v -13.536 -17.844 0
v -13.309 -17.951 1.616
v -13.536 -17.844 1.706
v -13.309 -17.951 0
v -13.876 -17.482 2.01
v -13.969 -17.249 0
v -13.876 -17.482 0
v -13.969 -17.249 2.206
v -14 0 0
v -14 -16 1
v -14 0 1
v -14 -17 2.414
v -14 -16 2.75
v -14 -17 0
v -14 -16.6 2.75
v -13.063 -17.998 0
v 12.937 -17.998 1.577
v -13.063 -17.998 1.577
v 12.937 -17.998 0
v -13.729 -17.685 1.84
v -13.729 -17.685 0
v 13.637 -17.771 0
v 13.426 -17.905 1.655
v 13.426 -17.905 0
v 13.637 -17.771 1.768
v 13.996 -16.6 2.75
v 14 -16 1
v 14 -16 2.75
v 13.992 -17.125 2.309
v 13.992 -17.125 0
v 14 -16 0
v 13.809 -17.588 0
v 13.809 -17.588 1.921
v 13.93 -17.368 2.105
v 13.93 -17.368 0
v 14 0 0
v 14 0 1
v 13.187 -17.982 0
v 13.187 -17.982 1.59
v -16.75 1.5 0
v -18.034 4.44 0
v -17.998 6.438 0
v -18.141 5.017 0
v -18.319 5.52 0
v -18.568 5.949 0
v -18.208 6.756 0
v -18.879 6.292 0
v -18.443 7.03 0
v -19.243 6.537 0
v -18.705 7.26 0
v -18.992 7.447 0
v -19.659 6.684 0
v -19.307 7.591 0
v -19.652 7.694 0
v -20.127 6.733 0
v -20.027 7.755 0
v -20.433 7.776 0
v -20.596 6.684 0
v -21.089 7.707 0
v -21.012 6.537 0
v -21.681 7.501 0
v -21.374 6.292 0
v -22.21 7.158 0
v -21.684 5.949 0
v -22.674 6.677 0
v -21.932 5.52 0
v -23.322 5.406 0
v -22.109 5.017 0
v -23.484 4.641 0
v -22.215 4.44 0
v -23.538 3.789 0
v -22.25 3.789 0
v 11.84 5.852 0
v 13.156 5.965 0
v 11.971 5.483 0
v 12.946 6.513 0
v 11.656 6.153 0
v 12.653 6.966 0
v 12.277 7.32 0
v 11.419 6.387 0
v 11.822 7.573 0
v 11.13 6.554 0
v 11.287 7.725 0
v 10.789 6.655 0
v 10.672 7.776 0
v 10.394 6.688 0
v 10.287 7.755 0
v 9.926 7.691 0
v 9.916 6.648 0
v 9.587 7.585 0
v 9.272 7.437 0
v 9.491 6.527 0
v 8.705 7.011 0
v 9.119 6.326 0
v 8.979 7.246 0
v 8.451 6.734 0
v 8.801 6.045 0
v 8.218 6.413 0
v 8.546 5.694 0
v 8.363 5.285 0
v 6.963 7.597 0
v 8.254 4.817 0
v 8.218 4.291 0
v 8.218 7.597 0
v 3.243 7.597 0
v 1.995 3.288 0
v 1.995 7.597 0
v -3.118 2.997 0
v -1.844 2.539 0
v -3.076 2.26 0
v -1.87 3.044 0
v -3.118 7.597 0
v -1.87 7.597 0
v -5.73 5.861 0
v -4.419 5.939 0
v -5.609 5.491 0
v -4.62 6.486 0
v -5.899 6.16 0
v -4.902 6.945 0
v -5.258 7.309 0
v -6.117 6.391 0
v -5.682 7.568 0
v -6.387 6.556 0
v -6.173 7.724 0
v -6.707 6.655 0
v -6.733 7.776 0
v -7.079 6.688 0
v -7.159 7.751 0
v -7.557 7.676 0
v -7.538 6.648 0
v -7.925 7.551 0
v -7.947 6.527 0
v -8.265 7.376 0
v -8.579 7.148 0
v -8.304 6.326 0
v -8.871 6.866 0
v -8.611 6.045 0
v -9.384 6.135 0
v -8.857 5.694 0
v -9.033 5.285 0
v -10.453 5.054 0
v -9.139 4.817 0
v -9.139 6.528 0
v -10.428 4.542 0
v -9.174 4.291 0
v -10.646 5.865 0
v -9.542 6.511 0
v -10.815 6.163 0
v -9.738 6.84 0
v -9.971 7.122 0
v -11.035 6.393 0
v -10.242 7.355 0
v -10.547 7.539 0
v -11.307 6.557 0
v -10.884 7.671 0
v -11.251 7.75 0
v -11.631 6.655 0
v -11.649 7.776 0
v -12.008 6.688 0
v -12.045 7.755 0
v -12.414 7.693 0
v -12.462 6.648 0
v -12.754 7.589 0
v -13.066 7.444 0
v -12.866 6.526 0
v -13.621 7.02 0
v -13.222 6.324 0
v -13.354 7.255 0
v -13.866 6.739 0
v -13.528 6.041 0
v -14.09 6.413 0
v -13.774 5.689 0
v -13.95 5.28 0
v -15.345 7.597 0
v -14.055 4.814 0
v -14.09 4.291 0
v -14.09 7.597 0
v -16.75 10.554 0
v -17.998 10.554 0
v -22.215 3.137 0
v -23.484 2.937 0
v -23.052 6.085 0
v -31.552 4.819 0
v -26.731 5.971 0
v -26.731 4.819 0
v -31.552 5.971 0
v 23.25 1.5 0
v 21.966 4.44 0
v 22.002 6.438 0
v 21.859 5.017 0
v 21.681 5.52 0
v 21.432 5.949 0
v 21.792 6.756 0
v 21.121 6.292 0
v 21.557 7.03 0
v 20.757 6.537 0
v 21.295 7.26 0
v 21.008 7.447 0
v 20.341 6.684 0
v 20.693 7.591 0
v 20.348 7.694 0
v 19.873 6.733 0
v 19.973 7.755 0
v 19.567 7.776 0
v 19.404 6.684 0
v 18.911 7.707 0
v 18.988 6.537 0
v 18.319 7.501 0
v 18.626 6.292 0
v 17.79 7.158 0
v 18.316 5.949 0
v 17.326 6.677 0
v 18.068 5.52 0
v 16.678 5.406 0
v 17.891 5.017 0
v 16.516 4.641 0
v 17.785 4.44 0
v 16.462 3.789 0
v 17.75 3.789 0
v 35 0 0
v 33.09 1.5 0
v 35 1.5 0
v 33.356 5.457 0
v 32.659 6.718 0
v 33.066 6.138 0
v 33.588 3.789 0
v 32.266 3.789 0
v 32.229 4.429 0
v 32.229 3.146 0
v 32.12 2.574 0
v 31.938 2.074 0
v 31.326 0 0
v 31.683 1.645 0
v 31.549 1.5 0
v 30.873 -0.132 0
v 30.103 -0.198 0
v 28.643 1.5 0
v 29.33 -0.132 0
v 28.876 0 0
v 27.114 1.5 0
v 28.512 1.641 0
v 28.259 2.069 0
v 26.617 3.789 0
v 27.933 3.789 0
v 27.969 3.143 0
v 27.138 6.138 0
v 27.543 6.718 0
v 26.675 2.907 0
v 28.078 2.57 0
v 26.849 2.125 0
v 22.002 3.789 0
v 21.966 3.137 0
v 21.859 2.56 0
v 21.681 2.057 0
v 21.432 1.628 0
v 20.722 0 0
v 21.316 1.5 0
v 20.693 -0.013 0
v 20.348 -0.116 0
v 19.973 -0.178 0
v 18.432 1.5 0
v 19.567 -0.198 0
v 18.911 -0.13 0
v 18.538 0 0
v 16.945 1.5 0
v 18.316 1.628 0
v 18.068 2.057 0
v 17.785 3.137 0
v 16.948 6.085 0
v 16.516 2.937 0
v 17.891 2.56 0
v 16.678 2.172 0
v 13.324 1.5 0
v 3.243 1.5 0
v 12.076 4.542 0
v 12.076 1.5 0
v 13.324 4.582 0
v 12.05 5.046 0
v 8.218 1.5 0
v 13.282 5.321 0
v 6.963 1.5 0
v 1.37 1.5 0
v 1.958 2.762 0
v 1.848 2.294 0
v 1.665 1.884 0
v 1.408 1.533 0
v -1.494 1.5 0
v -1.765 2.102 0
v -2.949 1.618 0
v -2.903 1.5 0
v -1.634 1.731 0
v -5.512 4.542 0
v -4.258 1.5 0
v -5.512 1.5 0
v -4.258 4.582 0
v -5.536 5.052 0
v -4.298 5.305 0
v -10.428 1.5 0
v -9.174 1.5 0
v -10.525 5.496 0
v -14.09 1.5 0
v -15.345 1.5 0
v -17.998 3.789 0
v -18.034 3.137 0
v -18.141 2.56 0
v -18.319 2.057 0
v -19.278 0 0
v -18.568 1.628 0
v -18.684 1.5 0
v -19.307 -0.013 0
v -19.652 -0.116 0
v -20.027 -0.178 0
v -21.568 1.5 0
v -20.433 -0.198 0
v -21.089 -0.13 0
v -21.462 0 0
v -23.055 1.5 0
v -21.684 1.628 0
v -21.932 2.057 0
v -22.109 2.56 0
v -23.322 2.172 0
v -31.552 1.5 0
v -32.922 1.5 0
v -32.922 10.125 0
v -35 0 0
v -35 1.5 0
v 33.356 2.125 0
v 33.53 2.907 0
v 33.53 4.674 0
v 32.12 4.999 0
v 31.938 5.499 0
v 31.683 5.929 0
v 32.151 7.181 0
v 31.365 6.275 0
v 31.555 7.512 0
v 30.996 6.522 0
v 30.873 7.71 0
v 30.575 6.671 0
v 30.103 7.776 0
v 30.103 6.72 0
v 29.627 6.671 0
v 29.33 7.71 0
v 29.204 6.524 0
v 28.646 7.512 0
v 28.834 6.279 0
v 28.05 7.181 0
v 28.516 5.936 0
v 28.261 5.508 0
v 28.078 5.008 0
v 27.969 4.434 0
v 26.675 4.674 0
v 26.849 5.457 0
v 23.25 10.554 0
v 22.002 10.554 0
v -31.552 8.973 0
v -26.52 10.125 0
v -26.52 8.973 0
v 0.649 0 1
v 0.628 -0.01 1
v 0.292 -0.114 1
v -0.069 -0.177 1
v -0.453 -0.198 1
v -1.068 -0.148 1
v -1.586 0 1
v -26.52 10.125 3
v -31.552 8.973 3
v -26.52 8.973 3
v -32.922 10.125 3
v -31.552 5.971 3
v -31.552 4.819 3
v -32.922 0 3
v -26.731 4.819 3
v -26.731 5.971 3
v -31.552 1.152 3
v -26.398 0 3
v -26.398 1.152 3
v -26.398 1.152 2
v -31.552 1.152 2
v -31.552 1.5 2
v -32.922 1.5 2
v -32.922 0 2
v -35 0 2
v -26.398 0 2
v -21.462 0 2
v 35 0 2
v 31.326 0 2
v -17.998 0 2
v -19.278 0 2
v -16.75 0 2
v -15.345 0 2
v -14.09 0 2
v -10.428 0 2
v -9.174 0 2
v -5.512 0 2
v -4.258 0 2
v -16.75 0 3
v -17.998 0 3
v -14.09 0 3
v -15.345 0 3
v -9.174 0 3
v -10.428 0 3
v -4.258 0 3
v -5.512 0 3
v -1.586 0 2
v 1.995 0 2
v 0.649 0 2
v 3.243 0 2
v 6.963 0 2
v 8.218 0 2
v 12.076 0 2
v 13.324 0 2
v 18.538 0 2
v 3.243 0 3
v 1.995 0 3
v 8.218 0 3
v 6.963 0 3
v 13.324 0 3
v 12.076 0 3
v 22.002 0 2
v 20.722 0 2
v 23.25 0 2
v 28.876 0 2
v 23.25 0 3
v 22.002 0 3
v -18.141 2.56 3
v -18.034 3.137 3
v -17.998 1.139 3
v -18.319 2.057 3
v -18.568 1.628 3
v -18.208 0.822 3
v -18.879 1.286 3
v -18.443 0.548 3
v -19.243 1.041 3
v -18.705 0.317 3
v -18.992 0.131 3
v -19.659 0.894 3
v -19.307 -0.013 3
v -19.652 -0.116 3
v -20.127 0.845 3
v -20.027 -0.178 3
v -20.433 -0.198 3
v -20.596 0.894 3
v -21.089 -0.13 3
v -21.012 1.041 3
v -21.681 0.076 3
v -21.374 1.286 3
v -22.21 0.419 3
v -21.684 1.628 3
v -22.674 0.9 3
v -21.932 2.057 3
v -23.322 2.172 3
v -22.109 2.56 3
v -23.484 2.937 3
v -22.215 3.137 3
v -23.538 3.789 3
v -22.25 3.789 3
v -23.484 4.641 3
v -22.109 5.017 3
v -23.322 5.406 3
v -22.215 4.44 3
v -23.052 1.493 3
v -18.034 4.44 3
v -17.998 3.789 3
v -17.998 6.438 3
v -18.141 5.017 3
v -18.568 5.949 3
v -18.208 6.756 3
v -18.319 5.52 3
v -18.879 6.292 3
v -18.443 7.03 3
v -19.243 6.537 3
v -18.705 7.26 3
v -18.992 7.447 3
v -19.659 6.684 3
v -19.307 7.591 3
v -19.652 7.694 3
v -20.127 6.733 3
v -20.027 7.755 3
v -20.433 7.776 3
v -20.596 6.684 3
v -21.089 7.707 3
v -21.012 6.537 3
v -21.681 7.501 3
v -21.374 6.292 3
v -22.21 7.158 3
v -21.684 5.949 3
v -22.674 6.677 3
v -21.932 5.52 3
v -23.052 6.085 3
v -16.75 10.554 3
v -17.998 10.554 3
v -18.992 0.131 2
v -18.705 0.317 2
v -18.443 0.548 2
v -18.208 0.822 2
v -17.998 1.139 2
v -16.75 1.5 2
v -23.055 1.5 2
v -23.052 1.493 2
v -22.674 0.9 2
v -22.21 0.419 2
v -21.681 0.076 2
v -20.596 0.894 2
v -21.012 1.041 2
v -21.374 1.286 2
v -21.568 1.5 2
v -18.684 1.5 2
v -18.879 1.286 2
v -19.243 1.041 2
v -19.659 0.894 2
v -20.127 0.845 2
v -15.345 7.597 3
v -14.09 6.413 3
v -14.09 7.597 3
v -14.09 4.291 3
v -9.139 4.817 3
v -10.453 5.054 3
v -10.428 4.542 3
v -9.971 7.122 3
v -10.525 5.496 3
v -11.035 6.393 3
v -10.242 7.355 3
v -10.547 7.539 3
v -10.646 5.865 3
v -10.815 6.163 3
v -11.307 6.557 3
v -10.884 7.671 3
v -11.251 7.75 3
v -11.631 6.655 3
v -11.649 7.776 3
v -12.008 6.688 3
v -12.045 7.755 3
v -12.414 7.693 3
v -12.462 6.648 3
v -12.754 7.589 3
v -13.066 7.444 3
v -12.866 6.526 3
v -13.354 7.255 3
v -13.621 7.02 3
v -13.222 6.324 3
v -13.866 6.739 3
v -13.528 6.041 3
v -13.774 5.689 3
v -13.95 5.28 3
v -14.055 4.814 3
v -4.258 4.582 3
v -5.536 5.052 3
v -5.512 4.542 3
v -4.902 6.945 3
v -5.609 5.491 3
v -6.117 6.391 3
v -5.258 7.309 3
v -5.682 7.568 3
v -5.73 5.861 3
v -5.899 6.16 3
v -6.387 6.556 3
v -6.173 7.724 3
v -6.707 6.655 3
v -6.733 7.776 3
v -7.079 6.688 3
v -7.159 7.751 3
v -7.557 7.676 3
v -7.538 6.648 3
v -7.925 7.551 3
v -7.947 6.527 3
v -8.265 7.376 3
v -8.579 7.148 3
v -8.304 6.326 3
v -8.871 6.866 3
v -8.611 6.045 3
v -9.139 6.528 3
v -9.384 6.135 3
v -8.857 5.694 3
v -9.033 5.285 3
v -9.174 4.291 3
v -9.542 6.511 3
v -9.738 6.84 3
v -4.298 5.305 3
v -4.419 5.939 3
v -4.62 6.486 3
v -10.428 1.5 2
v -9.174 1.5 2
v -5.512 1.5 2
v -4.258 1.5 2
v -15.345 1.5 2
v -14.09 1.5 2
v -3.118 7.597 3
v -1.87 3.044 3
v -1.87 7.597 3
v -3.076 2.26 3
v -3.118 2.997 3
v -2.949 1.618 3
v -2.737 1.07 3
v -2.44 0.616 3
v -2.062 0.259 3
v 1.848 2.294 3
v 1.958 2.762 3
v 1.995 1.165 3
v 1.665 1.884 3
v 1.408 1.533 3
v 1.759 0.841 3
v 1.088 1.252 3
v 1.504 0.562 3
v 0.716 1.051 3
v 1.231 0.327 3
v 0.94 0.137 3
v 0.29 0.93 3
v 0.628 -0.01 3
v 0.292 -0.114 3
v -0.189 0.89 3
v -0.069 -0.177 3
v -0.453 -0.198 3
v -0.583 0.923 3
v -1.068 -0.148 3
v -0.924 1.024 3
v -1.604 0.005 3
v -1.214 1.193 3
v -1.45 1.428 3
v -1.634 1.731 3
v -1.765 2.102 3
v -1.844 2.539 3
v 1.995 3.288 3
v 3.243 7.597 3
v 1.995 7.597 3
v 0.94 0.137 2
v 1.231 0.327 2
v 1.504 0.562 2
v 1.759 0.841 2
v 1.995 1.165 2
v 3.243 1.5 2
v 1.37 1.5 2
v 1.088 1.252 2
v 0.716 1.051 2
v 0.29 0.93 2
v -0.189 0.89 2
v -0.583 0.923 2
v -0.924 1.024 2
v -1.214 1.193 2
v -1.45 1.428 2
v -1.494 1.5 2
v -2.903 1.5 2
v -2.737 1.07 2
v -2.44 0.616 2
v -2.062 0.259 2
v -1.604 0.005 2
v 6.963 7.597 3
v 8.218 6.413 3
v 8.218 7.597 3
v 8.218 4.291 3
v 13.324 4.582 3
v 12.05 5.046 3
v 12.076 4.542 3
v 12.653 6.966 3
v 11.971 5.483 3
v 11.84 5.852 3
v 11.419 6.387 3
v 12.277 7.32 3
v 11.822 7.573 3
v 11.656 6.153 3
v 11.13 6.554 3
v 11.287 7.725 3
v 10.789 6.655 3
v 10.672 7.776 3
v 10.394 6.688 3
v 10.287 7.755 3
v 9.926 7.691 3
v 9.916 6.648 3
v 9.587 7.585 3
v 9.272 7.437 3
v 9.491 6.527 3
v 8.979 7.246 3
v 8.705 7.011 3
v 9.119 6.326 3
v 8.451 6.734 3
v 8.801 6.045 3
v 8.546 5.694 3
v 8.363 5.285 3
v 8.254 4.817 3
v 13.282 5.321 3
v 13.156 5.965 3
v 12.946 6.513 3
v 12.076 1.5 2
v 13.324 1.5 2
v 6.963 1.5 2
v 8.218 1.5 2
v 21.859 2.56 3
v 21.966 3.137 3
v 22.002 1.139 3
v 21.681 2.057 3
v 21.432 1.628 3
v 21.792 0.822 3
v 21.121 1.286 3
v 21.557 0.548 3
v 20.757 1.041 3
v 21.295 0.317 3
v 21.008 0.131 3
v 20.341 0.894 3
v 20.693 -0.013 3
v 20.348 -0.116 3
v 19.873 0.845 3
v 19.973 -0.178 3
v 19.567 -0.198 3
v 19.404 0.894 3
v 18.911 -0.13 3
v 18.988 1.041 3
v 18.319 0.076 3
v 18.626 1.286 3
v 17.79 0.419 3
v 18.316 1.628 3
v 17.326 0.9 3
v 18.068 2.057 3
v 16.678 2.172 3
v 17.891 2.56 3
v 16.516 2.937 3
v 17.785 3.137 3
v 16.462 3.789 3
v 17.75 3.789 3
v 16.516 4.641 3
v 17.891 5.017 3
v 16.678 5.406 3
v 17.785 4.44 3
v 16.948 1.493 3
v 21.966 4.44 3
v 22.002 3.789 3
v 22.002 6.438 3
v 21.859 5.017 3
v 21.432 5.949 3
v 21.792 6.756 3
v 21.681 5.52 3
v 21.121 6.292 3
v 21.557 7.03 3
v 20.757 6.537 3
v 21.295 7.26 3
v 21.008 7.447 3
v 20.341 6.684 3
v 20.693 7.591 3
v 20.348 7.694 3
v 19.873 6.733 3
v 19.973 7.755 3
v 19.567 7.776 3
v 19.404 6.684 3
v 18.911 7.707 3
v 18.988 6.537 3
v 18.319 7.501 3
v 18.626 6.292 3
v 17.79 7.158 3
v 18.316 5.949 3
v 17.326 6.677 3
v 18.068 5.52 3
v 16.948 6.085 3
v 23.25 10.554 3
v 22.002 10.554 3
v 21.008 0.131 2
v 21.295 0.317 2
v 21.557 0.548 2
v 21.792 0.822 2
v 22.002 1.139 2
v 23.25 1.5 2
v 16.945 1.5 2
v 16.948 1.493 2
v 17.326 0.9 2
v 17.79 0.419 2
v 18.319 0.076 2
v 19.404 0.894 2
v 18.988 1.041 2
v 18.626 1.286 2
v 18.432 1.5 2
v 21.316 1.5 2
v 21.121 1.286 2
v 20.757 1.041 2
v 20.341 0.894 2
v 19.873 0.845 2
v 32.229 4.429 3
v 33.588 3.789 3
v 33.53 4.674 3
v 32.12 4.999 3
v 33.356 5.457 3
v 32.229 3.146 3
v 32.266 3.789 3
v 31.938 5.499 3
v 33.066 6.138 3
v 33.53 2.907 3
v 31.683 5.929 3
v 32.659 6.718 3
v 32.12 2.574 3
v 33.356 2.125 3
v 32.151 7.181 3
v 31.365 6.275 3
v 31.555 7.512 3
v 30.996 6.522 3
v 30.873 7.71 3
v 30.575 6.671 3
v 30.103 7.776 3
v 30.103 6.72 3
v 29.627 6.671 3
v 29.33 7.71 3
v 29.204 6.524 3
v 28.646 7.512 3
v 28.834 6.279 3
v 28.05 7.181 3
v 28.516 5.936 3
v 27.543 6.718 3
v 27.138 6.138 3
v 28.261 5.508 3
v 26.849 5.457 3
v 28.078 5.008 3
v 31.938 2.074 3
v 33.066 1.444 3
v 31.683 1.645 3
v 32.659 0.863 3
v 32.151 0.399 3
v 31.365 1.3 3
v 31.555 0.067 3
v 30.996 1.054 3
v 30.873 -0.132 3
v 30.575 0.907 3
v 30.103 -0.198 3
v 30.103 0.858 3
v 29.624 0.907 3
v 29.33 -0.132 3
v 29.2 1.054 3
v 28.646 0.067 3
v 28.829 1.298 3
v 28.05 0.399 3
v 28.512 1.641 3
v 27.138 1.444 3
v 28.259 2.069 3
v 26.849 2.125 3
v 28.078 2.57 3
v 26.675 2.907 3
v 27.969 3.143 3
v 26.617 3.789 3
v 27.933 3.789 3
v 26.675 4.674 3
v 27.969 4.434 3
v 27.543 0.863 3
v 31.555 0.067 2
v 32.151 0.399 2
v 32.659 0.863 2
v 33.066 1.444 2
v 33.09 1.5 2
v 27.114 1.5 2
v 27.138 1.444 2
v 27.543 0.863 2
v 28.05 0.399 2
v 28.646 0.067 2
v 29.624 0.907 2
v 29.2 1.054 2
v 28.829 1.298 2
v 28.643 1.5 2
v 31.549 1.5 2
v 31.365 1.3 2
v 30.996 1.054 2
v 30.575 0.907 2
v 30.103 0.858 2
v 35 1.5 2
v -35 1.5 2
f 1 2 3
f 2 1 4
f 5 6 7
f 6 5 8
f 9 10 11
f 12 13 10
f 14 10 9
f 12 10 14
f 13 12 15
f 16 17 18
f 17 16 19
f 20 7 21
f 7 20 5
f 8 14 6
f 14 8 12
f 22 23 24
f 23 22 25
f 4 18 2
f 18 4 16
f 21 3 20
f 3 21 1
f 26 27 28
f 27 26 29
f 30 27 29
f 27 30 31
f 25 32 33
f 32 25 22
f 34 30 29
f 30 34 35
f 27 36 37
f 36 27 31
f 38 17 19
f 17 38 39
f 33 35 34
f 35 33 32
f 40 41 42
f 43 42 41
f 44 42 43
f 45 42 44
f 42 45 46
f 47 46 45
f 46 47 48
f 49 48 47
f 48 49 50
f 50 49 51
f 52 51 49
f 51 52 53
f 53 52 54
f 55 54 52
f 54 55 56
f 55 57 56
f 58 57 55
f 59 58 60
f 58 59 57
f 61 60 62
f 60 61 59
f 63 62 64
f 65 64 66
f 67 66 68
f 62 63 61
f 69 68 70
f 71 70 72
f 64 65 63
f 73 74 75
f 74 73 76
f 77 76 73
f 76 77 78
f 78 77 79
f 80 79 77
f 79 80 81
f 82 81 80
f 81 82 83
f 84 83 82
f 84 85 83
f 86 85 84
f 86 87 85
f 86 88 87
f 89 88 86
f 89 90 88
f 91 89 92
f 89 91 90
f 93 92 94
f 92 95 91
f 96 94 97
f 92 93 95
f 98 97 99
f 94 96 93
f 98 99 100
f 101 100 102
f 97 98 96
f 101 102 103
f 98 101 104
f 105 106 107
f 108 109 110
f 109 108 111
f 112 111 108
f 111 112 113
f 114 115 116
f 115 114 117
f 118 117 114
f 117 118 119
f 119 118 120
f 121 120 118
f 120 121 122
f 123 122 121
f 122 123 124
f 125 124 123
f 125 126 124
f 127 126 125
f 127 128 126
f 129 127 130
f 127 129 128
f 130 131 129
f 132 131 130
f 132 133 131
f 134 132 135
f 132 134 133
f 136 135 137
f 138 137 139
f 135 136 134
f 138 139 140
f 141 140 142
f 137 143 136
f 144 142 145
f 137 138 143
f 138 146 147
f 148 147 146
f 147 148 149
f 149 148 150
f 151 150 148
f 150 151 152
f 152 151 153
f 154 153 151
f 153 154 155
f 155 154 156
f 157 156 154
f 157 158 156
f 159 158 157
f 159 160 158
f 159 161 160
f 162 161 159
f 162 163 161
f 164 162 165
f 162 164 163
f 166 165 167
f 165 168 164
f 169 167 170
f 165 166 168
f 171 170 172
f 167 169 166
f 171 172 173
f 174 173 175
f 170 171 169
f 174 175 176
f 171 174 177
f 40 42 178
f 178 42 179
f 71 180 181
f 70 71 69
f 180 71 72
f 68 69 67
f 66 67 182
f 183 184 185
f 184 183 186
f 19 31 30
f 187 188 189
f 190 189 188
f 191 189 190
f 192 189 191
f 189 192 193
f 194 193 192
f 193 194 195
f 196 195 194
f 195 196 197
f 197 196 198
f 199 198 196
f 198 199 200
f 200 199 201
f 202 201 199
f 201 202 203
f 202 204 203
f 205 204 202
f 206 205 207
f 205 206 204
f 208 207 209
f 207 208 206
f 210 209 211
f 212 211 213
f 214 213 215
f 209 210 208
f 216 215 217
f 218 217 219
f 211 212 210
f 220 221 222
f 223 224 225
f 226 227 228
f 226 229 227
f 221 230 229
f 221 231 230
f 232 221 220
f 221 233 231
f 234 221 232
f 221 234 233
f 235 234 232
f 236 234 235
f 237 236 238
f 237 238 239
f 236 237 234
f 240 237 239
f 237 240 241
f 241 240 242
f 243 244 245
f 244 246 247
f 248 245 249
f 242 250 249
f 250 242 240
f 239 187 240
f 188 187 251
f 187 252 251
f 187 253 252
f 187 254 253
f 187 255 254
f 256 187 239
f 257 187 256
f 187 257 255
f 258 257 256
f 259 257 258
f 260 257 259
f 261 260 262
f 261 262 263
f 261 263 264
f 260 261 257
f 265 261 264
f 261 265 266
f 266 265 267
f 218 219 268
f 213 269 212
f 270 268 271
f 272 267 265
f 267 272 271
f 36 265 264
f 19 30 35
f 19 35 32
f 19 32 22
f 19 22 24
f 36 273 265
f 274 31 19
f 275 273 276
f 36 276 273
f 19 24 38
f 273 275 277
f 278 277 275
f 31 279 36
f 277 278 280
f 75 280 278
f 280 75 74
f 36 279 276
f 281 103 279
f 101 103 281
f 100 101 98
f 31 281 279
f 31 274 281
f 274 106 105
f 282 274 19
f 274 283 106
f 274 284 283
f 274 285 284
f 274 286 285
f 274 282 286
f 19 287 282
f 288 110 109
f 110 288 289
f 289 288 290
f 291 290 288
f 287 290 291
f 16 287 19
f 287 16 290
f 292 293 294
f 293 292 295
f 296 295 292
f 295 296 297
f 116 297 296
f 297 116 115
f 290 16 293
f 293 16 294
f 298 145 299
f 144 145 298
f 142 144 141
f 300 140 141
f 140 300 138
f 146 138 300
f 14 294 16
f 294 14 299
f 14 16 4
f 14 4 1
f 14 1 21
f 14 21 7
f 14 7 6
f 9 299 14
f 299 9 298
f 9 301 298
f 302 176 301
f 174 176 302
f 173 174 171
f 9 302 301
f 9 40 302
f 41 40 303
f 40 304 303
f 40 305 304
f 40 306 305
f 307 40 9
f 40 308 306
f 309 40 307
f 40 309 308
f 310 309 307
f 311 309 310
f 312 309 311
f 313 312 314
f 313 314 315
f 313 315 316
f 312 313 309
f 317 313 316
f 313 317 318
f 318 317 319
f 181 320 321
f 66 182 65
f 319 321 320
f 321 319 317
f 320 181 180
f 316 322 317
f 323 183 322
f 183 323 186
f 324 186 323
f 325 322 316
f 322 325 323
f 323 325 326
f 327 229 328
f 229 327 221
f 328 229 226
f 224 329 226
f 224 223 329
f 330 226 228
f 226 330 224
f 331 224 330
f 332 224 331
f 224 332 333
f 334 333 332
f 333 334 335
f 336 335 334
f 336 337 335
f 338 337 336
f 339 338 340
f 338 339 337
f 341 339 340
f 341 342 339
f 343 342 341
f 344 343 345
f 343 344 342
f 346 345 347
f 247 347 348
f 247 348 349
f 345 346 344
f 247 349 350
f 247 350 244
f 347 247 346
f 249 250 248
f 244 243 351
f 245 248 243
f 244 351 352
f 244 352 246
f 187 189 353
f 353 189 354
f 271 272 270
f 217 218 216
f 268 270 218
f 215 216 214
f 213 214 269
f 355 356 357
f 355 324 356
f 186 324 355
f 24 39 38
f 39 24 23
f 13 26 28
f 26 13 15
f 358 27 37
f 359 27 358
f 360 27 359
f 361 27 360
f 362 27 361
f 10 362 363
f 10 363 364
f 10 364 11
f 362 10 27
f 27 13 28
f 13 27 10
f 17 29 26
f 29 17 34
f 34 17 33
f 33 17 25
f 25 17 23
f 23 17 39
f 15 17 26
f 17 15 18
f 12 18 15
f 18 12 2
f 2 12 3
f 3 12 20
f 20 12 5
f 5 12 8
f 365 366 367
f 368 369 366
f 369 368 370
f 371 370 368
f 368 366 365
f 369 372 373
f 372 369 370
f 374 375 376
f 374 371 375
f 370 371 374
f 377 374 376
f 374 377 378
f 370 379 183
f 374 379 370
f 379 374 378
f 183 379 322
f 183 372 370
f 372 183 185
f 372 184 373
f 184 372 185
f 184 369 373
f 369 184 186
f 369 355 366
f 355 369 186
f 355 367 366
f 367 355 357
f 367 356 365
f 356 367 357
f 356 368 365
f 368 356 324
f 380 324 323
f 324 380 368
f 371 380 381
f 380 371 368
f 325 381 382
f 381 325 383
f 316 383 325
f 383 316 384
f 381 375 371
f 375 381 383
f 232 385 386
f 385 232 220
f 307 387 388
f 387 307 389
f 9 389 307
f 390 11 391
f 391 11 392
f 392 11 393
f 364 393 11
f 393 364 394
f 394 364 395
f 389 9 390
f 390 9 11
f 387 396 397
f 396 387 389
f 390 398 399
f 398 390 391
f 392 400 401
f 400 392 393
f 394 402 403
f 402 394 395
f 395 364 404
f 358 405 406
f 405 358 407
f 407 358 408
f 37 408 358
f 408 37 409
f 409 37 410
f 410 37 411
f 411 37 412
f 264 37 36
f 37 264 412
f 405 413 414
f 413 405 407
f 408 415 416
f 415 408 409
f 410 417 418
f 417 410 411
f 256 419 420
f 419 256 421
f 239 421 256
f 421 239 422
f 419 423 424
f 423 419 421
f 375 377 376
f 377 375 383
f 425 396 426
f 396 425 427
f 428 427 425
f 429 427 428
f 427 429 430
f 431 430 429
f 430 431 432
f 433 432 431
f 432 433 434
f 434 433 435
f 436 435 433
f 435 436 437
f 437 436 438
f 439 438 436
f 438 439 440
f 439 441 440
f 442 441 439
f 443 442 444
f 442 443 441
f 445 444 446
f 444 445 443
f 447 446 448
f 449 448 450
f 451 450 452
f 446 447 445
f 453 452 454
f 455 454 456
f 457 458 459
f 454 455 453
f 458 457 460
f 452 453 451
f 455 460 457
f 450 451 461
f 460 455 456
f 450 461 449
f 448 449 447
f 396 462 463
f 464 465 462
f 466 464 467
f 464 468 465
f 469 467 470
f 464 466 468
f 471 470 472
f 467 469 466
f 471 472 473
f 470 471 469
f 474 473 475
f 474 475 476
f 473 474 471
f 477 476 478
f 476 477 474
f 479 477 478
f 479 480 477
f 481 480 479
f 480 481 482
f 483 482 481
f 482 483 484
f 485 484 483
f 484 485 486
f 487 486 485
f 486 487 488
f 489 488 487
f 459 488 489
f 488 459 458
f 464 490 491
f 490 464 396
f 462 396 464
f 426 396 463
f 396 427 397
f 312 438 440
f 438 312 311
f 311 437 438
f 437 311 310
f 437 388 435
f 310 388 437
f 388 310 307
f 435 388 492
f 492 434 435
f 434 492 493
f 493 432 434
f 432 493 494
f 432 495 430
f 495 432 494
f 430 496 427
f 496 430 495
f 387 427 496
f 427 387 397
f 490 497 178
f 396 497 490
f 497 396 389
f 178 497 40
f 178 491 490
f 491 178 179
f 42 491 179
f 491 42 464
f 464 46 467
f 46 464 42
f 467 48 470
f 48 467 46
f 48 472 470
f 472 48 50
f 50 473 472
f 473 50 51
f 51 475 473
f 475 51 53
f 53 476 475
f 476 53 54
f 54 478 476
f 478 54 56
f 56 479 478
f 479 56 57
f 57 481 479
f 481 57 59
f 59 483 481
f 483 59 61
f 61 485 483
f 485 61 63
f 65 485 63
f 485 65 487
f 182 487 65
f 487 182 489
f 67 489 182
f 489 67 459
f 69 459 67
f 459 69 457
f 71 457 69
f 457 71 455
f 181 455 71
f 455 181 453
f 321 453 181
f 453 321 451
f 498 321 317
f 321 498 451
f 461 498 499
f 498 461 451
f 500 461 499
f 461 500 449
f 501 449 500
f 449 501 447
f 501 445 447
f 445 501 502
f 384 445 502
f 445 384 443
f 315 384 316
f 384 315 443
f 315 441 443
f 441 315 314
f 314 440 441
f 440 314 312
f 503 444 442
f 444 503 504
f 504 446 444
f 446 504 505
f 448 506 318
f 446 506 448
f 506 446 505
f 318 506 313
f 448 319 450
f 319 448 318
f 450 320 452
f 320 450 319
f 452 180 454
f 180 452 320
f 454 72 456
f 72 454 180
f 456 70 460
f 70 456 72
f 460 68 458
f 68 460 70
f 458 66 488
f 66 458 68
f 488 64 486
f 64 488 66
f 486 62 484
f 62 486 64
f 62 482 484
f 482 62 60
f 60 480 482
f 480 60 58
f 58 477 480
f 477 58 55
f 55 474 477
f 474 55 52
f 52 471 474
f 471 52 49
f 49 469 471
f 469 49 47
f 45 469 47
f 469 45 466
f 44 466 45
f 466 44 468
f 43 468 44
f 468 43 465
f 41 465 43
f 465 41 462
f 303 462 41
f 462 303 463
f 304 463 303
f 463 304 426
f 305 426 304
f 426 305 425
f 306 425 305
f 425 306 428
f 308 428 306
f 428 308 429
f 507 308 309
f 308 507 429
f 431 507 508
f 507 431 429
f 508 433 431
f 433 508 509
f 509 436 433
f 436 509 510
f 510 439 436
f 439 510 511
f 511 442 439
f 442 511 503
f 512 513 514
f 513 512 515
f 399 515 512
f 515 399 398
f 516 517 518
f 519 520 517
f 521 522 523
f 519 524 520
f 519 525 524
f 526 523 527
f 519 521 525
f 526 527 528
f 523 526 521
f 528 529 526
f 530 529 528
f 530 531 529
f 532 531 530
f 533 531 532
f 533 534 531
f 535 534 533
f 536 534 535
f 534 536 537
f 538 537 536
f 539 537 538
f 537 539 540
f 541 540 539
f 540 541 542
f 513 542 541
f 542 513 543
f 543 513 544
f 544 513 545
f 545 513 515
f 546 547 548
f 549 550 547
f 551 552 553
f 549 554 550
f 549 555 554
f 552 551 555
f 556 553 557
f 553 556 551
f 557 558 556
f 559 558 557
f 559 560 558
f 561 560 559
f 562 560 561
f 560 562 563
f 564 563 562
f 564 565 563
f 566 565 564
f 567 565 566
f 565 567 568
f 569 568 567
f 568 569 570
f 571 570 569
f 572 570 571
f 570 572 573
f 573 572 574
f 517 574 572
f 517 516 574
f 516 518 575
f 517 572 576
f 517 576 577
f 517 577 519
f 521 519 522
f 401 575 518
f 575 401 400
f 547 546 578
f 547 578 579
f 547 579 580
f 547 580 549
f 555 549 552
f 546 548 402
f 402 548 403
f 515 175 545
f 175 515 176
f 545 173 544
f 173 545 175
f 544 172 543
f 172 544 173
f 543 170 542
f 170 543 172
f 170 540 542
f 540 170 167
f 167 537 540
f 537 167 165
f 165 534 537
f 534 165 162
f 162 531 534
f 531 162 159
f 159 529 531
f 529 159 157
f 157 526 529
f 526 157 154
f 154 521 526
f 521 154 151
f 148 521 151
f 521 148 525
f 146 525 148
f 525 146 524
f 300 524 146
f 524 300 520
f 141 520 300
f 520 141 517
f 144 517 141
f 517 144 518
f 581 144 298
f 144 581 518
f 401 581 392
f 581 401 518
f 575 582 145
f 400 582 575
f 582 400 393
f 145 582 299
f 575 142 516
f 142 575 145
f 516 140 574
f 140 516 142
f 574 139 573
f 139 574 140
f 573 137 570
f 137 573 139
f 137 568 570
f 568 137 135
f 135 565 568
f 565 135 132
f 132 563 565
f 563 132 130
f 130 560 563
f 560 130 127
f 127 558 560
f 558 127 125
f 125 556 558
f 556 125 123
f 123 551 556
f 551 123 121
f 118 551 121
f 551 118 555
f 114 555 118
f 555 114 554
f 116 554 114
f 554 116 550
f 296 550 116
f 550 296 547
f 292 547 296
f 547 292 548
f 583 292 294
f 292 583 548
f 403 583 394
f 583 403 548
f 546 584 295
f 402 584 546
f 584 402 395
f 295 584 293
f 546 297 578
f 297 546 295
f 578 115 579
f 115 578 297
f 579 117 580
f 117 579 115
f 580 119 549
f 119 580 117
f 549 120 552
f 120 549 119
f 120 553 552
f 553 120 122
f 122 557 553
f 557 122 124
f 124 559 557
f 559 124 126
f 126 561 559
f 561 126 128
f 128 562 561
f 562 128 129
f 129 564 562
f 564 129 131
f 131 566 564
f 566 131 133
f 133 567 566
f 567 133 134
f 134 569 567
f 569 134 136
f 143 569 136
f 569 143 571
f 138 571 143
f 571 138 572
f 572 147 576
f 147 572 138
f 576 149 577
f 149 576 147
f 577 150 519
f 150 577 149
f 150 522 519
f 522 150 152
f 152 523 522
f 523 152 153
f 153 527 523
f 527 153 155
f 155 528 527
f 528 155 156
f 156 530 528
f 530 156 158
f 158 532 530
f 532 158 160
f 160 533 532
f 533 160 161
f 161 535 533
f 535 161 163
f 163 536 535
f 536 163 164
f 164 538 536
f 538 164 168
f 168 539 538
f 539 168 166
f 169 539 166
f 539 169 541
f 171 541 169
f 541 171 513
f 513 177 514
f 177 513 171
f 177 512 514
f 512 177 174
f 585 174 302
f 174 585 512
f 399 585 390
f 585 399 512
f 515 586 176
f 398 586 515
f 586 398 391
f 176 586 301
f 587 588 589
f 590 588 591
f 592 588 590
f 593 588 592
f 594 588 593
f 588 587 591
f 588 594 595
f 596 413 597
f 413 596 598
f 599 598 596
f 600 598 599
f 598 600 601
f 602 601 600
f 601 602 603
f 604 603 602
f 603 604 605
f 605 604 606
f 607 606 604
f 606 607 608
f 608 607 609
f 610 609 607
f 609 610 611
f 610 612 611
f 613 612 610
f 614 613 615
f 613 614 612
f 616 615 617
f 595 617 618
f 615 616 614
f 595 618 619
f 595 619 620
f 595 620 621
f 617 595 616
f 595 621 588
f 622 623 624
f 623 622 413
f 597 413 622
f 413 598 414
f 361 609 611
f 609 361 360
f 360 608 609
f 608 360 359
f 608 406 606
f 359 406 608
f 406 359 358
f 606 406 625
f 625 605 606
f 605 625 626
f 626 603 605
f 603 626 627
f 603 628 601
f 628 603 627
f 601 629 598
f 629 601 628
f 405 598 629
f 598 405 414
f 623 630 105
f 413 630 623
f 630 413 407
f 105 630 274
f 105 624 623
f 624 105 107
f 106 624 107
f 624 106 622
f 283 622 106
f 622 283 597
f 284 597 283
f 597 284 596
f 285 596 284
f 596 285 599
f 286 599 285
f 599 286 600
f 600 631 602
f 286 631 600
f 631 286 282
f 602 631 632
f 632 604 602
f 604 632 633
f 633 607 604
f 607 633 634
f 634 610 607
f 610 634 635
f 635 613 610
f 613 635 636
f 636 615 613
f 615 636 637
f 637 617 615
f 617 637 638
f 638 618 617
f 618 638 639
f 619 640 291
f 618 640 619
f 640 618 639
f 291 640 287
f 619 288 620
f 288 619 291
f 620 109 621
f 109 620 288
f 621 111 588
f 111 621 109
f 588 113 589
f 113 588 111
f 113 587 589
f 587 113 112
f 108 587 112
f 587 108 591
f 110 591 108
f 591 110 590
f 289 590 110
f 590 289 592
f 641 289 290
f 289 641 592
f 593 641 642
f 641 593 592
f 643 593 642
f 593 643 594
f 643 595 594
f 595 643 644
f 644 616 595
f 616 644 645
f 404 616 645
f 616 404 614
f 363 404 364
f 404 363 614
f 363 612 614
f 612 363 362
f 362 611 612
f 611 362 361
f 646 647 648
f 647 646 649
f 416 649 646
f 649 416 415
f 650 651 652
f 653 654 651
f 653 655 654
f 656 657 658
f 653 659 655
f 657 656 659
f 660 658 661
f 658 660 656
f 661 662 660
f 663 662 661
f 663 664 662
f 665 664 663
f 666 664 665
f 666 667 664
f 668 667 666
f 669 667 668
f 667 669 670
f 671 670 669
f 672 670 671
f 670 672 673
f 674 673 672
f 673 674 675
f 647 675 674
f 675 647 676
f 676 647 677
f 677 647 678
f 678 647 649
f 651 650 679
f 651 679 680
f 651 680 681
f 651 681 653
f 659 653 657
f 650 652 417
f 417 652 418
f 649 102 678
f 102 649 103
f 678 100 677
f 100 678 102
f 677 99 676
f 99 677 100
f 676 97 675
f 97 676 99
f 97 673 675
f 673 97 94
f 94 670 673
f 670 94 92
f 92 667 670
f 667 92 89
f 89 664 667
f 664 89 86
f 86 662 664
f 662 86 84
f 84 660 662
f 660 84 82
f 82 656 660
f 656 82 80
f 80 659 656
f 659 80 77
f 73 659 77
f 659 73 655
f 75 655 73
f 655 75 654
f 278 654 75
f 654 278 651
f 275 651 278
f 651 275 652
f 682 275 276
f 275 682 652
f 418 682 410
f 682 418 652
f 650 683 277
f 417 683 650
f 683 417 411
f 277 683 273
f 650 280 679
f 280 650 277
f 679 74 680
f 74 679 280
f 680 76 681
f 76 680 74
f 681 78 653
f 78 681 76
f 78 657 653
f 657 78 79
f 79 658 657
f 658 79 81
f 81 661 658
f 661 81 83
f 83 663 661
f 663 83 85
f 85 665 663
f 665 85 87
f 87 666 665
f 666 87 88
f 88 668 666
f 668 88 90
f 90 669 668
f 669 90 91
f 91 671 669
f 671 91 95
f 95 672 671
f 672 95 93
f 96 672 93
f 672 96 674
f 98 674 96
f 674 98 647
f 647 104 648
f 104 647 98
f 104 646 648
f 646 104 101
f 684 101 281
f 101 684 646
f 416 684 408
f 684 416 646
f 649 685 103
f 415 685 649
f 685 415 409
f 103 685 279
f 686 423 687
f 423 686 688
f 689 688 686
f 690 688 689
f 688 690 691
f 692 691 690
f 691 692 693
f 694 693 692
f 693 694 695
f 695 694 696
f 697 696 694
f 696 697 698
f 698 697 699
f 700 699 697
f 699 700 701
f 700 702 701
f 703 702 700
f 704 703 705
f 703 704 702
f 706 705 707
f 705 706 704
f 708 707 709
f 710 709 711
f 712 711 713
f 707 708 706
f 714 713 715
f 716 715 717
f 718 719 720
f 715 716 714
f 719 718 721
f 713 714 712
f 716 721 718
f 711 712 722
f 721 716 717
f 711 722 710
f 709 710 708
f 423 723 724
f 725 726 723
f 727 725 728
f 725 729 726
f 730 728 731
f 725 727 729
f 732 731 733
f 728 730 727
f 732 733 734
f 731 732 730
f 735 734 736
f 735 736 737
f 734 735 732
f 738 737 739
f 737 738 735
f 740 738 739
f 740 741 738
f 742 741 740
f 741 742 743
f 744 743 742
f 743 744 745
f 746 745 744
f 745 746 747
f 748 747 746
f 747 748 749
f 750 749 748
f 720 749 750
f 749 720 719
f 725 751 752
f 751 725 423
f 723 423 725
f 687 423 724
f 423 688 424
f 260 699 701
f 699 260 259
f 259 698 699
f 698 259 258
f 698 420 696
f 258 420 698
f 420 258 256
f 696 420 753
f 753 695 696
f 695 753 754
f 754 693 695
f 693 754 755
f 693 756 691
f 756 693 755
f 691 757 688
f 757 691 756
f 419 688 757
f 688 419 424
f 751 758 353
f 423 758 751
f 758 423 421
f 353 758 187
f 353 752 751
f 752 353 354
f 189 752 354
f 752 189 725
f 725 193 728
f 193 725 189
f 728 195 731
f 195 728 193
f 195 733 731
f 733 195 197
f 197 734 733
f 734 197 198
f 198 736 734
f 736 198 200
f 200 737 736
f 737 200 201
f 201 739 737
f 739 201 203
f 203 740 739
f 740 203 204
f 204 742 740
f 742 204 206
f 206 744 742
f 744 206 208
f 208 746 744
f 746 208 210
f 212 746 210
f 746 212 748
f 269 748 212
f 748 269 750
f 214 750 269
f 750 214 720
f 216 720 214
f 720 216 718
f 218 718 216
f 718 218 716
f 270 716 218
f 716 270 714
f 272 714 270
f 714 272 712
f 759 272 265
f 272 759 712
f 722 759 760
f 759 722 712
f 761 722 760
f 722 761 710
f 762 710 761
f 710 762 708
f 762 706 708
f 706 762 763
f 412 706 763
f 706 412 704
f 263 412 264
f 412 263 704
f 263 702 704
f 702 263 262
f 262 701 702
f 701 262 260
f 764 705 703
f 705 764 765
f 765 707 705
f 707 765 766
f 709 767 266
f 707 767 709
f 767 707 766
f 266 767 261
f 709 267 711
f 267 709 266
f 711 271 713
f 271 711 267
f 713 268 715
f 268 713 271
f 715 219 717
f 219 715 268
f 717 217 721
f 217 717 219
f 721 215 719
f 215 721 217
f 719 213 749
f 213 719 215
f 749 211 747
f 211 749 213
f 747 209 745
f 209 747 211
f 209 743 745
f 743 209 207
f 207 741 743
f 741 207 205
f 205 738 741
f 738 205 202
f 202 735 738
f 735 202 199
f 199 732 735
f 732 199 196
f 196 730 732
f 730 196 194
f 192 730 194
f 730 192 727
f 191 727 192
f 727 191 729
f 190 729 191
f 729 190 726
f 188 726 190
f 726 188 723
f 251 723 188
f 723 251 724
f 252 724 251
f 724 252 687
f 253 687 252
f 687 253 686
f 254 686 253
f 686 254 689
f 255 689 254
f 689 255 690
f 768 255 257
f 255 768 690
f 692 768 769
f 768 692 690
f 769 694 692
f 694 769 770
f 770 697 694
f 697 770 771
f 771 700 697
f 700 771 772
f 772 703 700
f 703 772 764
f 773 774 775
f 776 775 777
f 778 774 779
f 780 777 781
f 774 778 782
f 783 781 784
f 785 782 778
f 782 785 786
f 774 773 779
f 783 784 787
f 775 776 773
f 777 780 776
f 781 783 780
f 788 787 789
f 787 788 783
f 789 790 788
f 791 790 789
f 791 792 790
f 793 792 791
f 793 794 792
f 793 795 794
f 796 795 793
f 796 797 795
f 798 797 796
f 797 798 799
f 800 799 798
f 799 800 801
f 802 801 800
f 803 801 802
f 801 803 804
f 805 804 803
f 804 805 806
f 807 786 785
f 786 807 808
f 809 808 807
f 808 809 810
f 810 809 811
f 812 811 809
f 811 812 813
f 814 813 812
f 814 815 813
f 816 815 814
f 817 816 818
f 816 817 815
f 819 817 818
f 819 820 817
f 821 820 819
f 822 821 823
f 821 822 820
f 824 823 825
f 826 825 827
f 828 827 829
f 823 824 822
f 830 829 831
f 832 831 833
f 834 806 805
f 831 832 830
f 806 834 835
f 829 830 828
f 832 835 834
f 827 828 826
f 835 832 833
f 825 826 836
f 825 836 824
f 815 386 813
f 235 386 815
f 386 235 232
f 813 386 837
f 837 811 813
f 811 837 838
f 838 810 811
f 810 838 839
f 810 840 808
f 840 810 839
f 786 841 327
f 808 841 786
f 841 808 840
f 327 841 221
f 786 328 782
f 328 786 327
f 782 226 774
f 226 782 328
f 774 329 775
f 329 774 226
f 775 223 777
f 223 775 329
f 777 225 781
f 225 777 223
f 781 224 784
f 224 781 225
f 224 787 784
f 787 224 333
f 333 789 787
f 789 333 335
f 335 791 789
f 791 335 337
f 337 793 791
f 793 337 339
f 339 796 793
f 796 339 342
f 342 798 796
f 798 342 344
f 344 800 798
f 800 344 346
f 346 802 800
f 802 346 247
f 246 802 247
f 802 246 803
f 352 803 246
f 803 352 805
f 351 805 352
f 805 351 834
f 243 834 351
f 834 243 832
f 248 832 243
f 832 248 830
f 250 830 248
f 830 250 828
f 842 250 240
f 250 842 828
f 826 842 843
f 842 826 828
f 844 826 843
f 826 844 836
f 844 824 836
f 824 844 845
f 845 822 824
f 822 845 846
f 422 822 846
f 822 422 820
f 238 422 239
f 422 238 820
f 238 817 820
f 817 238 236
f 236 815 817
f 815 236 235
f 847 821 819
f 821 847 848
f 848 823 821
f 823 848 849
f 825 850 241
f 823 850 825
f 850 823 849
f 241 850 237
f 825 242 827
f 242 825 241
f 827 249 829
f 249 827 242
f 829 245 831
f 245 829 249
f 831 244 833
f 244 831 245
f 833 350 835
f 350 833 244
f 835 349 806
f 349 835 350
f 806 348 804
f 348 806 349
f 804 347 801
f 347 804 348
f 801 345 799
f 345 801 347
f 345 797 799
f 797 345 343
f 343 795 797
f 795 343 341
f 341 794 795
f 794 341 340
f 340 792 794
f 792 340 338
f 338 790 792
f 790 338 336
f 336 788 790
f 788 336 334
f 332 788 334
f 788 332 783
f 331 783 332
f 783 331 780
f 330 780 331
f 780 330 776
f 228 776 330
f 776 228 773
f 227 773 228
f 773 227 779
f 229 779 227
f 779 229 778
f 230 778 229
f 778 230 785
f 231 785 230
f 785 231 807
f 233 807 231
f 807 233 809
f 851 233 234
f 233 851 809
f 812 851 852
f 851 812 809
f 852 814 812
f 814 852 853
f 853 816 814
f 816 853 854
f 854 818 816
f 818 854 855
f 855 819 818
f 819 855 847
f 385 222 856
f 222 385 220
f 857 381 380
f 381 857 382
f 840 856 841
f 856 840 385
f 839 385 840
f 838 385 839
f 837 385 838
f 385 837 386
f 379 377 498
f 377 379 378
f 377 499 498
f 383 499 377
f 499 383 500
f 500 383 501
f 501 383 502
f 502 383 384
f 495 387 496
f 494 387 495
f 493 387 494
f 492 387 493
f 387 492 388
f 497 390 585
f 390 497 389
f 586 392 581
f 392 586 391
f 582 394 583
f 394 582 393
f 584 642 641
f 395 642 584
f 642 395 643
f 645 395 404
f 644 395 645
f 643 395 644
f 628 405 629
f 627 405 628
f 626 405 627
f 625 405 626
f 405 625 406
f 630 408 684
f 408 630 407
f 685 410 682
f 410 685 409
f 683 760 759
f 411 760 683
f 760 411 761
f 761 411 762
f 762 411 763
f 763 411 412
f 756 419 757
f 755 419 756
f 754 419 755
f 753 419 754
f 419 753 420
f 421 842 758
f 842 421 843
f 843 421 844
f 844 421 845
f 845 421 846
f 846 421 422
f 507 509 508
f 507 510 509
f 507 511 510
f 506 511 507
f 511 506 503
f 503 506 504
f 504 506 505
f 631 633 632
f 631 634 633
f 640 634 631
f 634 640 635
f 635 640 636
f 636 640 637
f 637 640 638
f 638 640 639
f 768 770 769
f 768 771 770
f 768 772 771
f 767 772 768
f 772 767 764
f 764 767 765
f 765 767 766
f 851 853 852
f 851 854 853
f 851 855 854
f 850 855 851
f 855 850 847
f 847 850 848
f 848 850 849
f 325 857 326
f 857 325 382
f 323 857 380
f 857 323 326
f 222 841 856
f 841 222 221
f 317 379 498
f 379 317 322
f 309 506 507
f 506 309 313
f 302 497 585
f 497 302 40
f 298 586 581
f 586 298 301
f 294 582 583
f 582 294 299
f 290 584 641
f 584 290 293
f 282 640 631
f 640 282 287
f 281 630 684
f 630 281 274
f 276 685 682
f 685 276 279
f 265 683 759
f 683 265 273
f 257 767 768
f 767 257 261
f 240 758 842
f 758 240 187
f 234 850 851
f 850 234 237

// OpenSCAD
//Hardhat accessory slot tab
//Writen by Dan Koss 1/2016. (Updated 1/23/16)
//Thanks to MC Geisler (thing:714444) for the font list. I'm still figuring out text and will trim don the list as I learn.
//Choose to import STL or Use custom text

/* [Add Text] */
//Text Line 1
line1 = "";
//Text Line 2
line2 = "";
//Text Line 3
line3 = "";
//Text Line 4
line4 = "Edmundo";

//Font name, e.g. "Libration Sans", "Aldo", depends on what is available on the platform. In the customizer,choose from about 700 Google Fonts. For an overview please refer: http://www.google.com/fonts
FontName="Orbitron"; //[ABeeZee,Abel,Abril Fatface,Aclonica,Acme,Actor,Adamina,Advent Pro,Aguafina Script,Akronim,Aladin,Aldrich,Alef,Alegreya,Alegreya Sans,Alegreya Sans SC,Alegreya SC,Alex Brush,Alfa Slab One,Alice,Alike,Alike Angular,Allan,Allerta,Allerta Stencil,Allura,Almendra,Almendra Display,Almendra SC,Amarante,Amaranth,Amatic SC,Amethysta,Amiri,Anaheim,Andada,Andika,Angkor,Annie Use Your Telescope,Anonymous Pro,Antic,Antic Didone,Antic Slab,Anton,Arapey,Arbutus,Arbutus Slab,Architects Daughter,Archivo Black,Archivo Narrow,Arimo,Arizonia,Armata,Artifika,Arvo,Asap,Asset,Astloch,Asul,Atomic Age,Aubrey,Audiowide,Autour One,Average,Average Sans,Averia Gruesa Libre,Averia Libre,Averia Sans Libre,Averia Serif Libre,Bad Script,Balthazar,Bangers,Basic,Battambang,Baumans,Bayon,Belgrano,Belleza,BenchNine,Bentham,Berkshire Swash,Bevan,Bigelow Rules,Bigshot One,Bilbo,Bilbo Swash Caps,Bitter,Black Ops One,Bokor,Bonbon,Boogaloo,Bowlby One,Bowlby One SC,Brawler,Bree Serif,Bubblegum Sans,Bubbler One,Buda,Buenard,Butcherman,Butterfly Kids,Cabin,Cabin Condensed,Cabin Sketch,Caesar Dressing,Cagliostro,Calligraffitti,Cambay,Cambo,Candal,Cantarell,Cantata One,Cantora One,Capriola,Cardo,Carme,Carrois Gothic,Carrois Gothic SC,Carter One,Caudex,Cedarville Cursive,Ceviche One,Changa One,Chango,Chau Philomene One,Chela One,Chelsea Market,Chenla,Cherry Cream Soda,Cherry Swash,Chewy,Chicle,Chivo,Cinzel,Cinzel Decorative,Clicker Script,Coda,Coda Caption,Codystar,Combo,Comfortaa,Coming Soon,Concert One,Condiment,Content,Contrail One,Convergence,Cookie,Copse,Corben,Courgette,Cousine,Coustard,Covered By Your Grace,Crafty Girls,Creepster,Crete Round,Crimson Text,Croissant One,Crushed,Cuprum,Cutive,Cutive Mono,Damion,Dancing Script,Dangrek,Dawning of a New Day,Days One,Dekko,Delius,Delius Swash Caps,Delius Unicase,Della Respira,Denk One,Devonshire,Dhurjati,Didact Gothic,Diplomata,Diplomata SC,Domine,Donegal One,Doppio One,Dorsa,Dosis,Dr Sugiyama,Droid Sans,Droid Sans Mono,Droid Serif,Duru Sans,Dynalight,Eagle Lake,Eater,EB Garamond,Economica,Ek Mukta,Electrolize,Elsie,Elsie Swash Caps,Emblema One,Emilys Candy,Engagement,Englebert,Enriqueta,Erica One,Esteban,Euphoria Script,Ewert,Exo,Exo 2,Expletus Sans,Fanwood Text,Fascinate,Fascinate Inline,Faster One,Fasthand,Fauna One,Federant,Federo,Felipa,Fenix,Finger Paint,Fira Mono,Fira Sans,Fjalla One,Fjord One,Flamenco,Flavors,Fondamento,Fontdiner Swanky,Forum,Francois One,Freckle Face,Fredericka the Great,Fredoka One,Freehand,Fresca,Frijole,Fruktur,Fugaz One,Gabriela,Gafata,Galdeano,Galindo,Gentium Basic,Gentium Book Basic,Geo,Geostar,Geostar Fill,Germania One,GFS Didot,GFS Neohellenic,Gidugu,Gilda Display,Give You Glory,Glass Antiqua,Glegoo,Gloria Hallelujah,Goblin One,Gochi Hand,Gorditas,Goudy Bookletter 1911,Graduate,Grand Hotel,Gravitas One,Great Vibes,Griffy,Gruppo,Gudea,Gurajada,Habibi,Halant,Hammersmith One,Hanalei,Hanalei Fill,Handlee,Hanuman,Happy Monkey,Headland One,Henny Penny,Herr Von Muellerhoff,Hind,Holtwood One SC,Homemade Apple,Homenaje,Iceberg,Iceland,IM Fell Double Pica,IM Fell Double Pica SC,IM Fell DW Pica,IM Fell DW Pica SC,IM Fell English,IM Fell English SC,IM Fell French Canon,IM Fell French Canon SC,IM Fell Great Primer,IM Fell Great Primer SC,Imprima,Inconsolata,Inder,Indie Flower,Inika,Irish Grover,Istok Web,Italiana,Italianno,Jacques Francois,Jacques Francois Shadow,Jim Nightshade,Jockey One,Jolly Lodger,Josefin Sans,Josefin Slab,Joti One,Judson,Julee,Julius Sans One,Junge,Jura,Just Another Hand,Just Me Again Down Here,Kalam,Kameron,Kantumruy,Karla,Karma,Kaushan Script,Kavoon,Kdam Thmor,Keania One,Kelly Slab,Kenia,Khand,Khmer,Khula,Kite One,Knewave,Kotta One,Koulen,Kranky,Kreon,Kristi,Krona One,La Belle Aurore,Laila,Lakki Reddy,Lancelot,Lateef,Lato,League Script,Leckerli One,Ledger,Lekton,Lemon,Liberation Sans,Libre Baskerville,Life Savers,Lilita One,Lily Script One,Limelight,Linden Hill,Lobster,Lobster Two,Londrina Outline,Londrina Shadow,Londrina Sketch,Londrina Solid,Lora,Love Ya Like A Sister,Loved by the King,Lovers Quarrel,Luckiest Guy,Lusitana,Lustria,Macondo,Macondo Swash Caps,Magra,Maiden Orange,Mako,Mallanna,Mandali,Marcellus,Marcellus SC,Marck Script,Margarine,Marko One,Marmelad,Martel Sans,Marvel,Mate,Mate SC,Maven Pro,McLaren,Meddon,MedievalSharp,Medula One,Megrim,Meie Script,Merienda,Merienda One,Merriweather,Merriweather Sans,Metal,Metal Mania,Metamorphous,Metrophobic,Michroma,Milonga,Miltonian,Miltonian Tattoo,Miniver,Miss Fajardose,Modak,Modern Antiqua,Molengo,Molle,Monda,Monofett,Monoton,Monsieur La Doulaise,Montaga,Montez,Montserrat,Montserrat Alternates,Montserrat Subrayada,Moul,Moulpali,Mountains of Christmas,Mouse Memoirs,Mr Bedfort,Mr Dafoe,Mr De Haviland,Mrs Saint Delafield,Mrs Sheppards,Muli,Mystery Quest,Neucha,Neuton,New Rocker,News Cycle,Niconne,Nixie One,Nobile,Nokora,Norican,Nosifer,Nothing You Could Do,Noticia Text,Noto Sans,Noto Serif,Nova Cut,Nova Flat,Nova Mono,Nova Oval,Nova Round,Nova Script,Nova Slim,Nova Square,NTR,Numans,Nunito,Odor Mean Chey,Offside,Old Standard TT,Oldenburg,Oleo Script,Oleo Script Swash Caps,Open Sans,Open Sans Condensed,Oranienbaum,Orbitron,Oregano,Orienta,Original Surfer,Oswald,Over the Rainbow,Overlock,Overlock SC,Ovo,Oxygen,Oxygen Mono,Pacifico,Paprika,Parisienne,Passero One,Passion One,Pathway Gothic One,Patrick Hand,Patrick Hand SC,Patua One,Paytone One,Peddana,Peralta,Permanent Marker,Petit Formal Script,Petrona,Philosopher,Piedra,Pinyon Script,Pirata One,Plaster,Play,Playball,Playfair Display,Playfair Display SC,Podkova,Poiret One,Poller One,Poly,Pompiere,Pontano Sans,Port Lligat Sans,Port Lligat Slab,Prata,Preahvihear,Press Start 2P,Princess Sofia,Prociono,Prosto One,PT Mono,PT Sans,PT Sans Caption,PT Sans Narrow,PT Serif,PT Serif Caption,Puritan,Purple Purse,Quando,Quantico,Quattrocento,Quattrocento Sans,Questrial,Quicksand,Quintessential,Qwigley,Racing Sans One,Radley,Rajdhani,Raleway,Raleway Dots,Ramabhadra,Ramaraja,Rambla,Rammetto One,Ranchers,Rancho,Ranga,Rationale,Ravi Prakash,Redressed,Reenie Beanie,Revalia,Ribeye,Ribeye Marrow,Righteous,Risque,Roboto,Roboto Condensed,Roboto Slab,Rochester,Rock Salt,Rokkitt,Romanesco,Ropa Sans,Rosario,Rosarivo,Rouge Script,Rozha One,Rubik Mono One,Rubik One,Ruda,Rufina,Ruge Boogie,Ruluko,Rum Raisin,Ruslan Display,Russo One,Ruthie,Rye,Sacramento,Sail,Salsa,Sanchez,Sancreek,Sansita One,Sarina,Sarpanch,Satisfy,Scada,Scheherazade,Schoolbell,Seaweed Script,Sevillana,Seymour One,Shadows Into Light,Shadows Into Light Two,Shanti,Share,Share Tech,Share Tech Mono,Shojumaru,Short Stack,Siemreap,Sigmar One,Signika,Signika Negative,Simonetta,Sintony,Sirin Stencil,Six Caps,Skranji,Slabo 13px,Slabo 27px,Slackey,Smokum,Smythe,Sniglet,Snippet,Snowburst One,Sofadi One,Sofia,Sonsie One,Sorts Mill Goudy,Source Code Pro,Source Sans Pro,Source Serif Pro,Special Elite,Spicy Rice,Spinnaker,Spirax,Squada One,Sree Krushnadevaraya,Stalemate,Stalinist One,Stardos Stencil,Stint Ultra Condensed,Stint Ultra Expanded,Stoke,Strait,Sue Ellen Francisco,Sunshiney,Supermercado One,Suranna,Suravaram,Suwannaphum,Swanky and Moo Moo,Syncopate,Tangerine,Taprom,Tauri,Teko,Telex,Tenali Ramakrishna,Tenor Sans,Text Me One,The Girl Next Door,Tienne,Timmana,Tinos,Titan One,Titillium Web,Trade Winds,Trocchi,Trochut,Trykker,Tulpen One,Ubuntu,Ubuntu Condensed,Ubuntu Mono,Ultra,Uncial Antiqua,Underdog,Unica One,UnifrakturCook,UnifrakturMaguntia,Unkempt,Unlock,Unna,Vampiro One,Varela,Varela Round,Vast Shadow,Vesper Libre,Vibur,Vidaloka,Viga,Voces,Volkhov,Vollkorn,Voltaire,VT323,Waiting for the Sunrise,Wallpoet,Walter Turncoat,Warnes,Wellfleet,Wendy One,Wire One,Yanone Kaffeesatz,Yellowtail,Yeseva One,Yesteryear,Zeyada]
//Font Size
FontSize = 10; //[1:.5:30]
//Font Spacing
FontSpace = 1; //[0:.1:2]
//Font Extrusion;
FontExtrude = 3; //[1:.1:10]
//Line Spacing
LineSpace = 1.1; //[0:.1:2]


/* [Hidden] */
stlortext = "text";

//The following is to import an STL File. Change "stlortext" to ="stl"
//and copy the STL file to the same folder as your .scad file
stlfile = "koss_insert.stl";
//Shift STL [x,y,z]
stlshift = [0,9,0];
//Scale STL [x,y,z] axis
stlscale = [1,1,1];
//Rotate STL about [x,y,z] axis
stlrotate = [0,0,0];

/* [Hidden] */
//Referenced constants for the TAB.
//Tshiftx = 15;
tabX = 28;
tabY = 16;
tabZ = 2.75;
tabHead = 1;
tabClip = 2;
rad=tabClip/2;

if (stlortext == "stl") {
    union(){
        translate([stlshift[0],stlshift[1],stlshift[2]]) scale([stlscale[0],stlscale[1],stlscale[2]]) rotate([stlrotate[0],stlrotate[1],stlrotate[2]]) import(stlfile);
        TAB();
    }
}
else if (stlortext == "text") {TextClip();}
else echo("error");


//
//Add Text. Line 4 at bottom and Line 1 at the Top
module TextClip (){
    union(){
        TAB();
        len_text = len(line4);
        translate([-((len_text)/2)*FontSize*FontSpace,0,0]) WriteText(line4,FontSize);
        translate([-((len_text)/2)*FontSize*FontSpace,0,0]) cube([(len_text)*FontSize*FontSpace,1.5,2]);
        
        if (line3 != "") {
            len_text = len(line3);
            translate([-((len_text)/2)*FontSize*FontSpace,FontSize*LineSpace,0]) WriteText(line3,FontSize);
            translate([-((len_text)/2)*FontSize*FontSpace,FontSize*LineSpace-1,0]) cube([(len_text)*FontSize*FontSpace,1.5+1+(FontSize*(LineSpace-1)),2]);
        }
        
        if (line2 != "") {
            len_text = len(line2);
            translate([-((len_text)/2)*FontSize*FontSpace,2*FontSize*LineSpace,0]) WriteText(line2, FontSize);
            translate([-((len_text)/2)*FontSize*FontSpace,2*(FontSize*LineSpace-1),0]) cube([(len_text)*FontSize*FontSpace,1.5+1+(FontSize*(LineSpace-1)),1]);
        }
        
        if (line1 != "") {
            len_text = len(line1);
            translate([-((len_text)/2)*FontSize*FontSpace,3*FontSize*LineSpace,0]) WriteText(line1,FontSize);
            translate([-((len_text)/2)*FontSize*FontSpace,3*(FontSize*LineSpace-1),0]) cube([(len_text)*FontSize*FontSpace,1.5+1+(FontSize*(LineSpace-1)),1]);
        }
    }
}


module WriteText (textstring, fontsize){
    len_text = len(textstring);
    for (i=[0:1:(len_text-1)]) {
        if(textstring[i]=="i"){
            translate([((i+.5)*FontSpace*FontSize),0,0]) HighDots(textstring[i]);
        }
        else if(textstring[i]=="j"){
            translate([((i+.5)*FontSpace*FontSize),0,0]) HighDots(textstring[i]);
        }
        else if(textstring[i]=="?"){
            translate([((i+.5)*FontSpace*FontSize),0,0]) LowDots(textstring[i]);
        }
        else if(textstring[i]=="!"){
            translate([((i+.5)*FontSpace*FontSize),0,0]) LowDots(textstring[i]);
        }
        else if(textstring[i]==":"){
            translate([((i+.5)*FontSpace*FontSize),0,0]) LowDots(textstring[i]);
        }
        else if(textstring[i]==";"){
            translate([((i+.5)*FontSpace*FontSize),0,0]) LowDots(textstring[i]);
        }
        else {
            translate([((i+.5)*FontSpace*FontSize),0,0]) {
            linear_extrude(height=FontExtrude,convexity=10)
                text(textstring[i],size=FontSize,font=FontName,halign="center",valign="baseline");
            }
        }
    }
}
module HighDots(letter){
     union(){
         translate([0,0,0]) hull(){
             difference(){
                linear_extrude(1) text(letter,size=FontSize,font=FontName,halign="center",valign="baseline");
                translate([-FontSize/2,-(FontSize)/3,-0.5]) cube([FontSize,FontSize,2]);
             }
         }
         linear_extrude(height=FontExtrude,convexity=10)
            text(letter,size=FontSize,font=FontName,halign="center",valign="baseline");
        }
}
 module LowDots(letter){
     union(){
         translate([0,0,0]) hull(){
             difference(){
                 linear_extrude(1) text(letter,size=FontSize,font=FontName,halign="center",valign="baseline");
                 translate([-FontSize/2,FontSize/3,-0.5]) cube([FontSize,FontSize,2]);
             }
         }
         linear_extrude(height=FontExtrude,convexity=10)
            text(letter,size=FontSize,font=FontName,halign="center",valign="baseline");
        }
}
 
//
//Draw the tab.
module TAB (){
    rotate([0,0,180]) difference(){
        hull(){ //outer shell
            translate([-tabX/2,0,0]) cube([tabX,tabY,tabZ]);
            translate([-tabX/2,-tabHead,0]) cube([tabX,tabHead,tabZ]);
            translate([-((tabX/2)-rad),tabY+tabClip-rad,0]) cylinder(h=tabZ, r=rad, $fn=25);
            translate([((tabX/2)-rad),tabY+tabClip-rad,0]) cylinder(h=tabZ, r=rad, $fn=25);
        }
        translate([-(tabX*1.1)/2,-tabHead-.1,1]) cube(size=[tabX*1.1,tabY+tabHead+.1,tabZ]);
        translate([-(tabX*1.1)/2,tabY+(0.3*tabClip),tabZ]) rotate([-40,0,0]) cube([tabX*1.1,10,5]);
    }
}
